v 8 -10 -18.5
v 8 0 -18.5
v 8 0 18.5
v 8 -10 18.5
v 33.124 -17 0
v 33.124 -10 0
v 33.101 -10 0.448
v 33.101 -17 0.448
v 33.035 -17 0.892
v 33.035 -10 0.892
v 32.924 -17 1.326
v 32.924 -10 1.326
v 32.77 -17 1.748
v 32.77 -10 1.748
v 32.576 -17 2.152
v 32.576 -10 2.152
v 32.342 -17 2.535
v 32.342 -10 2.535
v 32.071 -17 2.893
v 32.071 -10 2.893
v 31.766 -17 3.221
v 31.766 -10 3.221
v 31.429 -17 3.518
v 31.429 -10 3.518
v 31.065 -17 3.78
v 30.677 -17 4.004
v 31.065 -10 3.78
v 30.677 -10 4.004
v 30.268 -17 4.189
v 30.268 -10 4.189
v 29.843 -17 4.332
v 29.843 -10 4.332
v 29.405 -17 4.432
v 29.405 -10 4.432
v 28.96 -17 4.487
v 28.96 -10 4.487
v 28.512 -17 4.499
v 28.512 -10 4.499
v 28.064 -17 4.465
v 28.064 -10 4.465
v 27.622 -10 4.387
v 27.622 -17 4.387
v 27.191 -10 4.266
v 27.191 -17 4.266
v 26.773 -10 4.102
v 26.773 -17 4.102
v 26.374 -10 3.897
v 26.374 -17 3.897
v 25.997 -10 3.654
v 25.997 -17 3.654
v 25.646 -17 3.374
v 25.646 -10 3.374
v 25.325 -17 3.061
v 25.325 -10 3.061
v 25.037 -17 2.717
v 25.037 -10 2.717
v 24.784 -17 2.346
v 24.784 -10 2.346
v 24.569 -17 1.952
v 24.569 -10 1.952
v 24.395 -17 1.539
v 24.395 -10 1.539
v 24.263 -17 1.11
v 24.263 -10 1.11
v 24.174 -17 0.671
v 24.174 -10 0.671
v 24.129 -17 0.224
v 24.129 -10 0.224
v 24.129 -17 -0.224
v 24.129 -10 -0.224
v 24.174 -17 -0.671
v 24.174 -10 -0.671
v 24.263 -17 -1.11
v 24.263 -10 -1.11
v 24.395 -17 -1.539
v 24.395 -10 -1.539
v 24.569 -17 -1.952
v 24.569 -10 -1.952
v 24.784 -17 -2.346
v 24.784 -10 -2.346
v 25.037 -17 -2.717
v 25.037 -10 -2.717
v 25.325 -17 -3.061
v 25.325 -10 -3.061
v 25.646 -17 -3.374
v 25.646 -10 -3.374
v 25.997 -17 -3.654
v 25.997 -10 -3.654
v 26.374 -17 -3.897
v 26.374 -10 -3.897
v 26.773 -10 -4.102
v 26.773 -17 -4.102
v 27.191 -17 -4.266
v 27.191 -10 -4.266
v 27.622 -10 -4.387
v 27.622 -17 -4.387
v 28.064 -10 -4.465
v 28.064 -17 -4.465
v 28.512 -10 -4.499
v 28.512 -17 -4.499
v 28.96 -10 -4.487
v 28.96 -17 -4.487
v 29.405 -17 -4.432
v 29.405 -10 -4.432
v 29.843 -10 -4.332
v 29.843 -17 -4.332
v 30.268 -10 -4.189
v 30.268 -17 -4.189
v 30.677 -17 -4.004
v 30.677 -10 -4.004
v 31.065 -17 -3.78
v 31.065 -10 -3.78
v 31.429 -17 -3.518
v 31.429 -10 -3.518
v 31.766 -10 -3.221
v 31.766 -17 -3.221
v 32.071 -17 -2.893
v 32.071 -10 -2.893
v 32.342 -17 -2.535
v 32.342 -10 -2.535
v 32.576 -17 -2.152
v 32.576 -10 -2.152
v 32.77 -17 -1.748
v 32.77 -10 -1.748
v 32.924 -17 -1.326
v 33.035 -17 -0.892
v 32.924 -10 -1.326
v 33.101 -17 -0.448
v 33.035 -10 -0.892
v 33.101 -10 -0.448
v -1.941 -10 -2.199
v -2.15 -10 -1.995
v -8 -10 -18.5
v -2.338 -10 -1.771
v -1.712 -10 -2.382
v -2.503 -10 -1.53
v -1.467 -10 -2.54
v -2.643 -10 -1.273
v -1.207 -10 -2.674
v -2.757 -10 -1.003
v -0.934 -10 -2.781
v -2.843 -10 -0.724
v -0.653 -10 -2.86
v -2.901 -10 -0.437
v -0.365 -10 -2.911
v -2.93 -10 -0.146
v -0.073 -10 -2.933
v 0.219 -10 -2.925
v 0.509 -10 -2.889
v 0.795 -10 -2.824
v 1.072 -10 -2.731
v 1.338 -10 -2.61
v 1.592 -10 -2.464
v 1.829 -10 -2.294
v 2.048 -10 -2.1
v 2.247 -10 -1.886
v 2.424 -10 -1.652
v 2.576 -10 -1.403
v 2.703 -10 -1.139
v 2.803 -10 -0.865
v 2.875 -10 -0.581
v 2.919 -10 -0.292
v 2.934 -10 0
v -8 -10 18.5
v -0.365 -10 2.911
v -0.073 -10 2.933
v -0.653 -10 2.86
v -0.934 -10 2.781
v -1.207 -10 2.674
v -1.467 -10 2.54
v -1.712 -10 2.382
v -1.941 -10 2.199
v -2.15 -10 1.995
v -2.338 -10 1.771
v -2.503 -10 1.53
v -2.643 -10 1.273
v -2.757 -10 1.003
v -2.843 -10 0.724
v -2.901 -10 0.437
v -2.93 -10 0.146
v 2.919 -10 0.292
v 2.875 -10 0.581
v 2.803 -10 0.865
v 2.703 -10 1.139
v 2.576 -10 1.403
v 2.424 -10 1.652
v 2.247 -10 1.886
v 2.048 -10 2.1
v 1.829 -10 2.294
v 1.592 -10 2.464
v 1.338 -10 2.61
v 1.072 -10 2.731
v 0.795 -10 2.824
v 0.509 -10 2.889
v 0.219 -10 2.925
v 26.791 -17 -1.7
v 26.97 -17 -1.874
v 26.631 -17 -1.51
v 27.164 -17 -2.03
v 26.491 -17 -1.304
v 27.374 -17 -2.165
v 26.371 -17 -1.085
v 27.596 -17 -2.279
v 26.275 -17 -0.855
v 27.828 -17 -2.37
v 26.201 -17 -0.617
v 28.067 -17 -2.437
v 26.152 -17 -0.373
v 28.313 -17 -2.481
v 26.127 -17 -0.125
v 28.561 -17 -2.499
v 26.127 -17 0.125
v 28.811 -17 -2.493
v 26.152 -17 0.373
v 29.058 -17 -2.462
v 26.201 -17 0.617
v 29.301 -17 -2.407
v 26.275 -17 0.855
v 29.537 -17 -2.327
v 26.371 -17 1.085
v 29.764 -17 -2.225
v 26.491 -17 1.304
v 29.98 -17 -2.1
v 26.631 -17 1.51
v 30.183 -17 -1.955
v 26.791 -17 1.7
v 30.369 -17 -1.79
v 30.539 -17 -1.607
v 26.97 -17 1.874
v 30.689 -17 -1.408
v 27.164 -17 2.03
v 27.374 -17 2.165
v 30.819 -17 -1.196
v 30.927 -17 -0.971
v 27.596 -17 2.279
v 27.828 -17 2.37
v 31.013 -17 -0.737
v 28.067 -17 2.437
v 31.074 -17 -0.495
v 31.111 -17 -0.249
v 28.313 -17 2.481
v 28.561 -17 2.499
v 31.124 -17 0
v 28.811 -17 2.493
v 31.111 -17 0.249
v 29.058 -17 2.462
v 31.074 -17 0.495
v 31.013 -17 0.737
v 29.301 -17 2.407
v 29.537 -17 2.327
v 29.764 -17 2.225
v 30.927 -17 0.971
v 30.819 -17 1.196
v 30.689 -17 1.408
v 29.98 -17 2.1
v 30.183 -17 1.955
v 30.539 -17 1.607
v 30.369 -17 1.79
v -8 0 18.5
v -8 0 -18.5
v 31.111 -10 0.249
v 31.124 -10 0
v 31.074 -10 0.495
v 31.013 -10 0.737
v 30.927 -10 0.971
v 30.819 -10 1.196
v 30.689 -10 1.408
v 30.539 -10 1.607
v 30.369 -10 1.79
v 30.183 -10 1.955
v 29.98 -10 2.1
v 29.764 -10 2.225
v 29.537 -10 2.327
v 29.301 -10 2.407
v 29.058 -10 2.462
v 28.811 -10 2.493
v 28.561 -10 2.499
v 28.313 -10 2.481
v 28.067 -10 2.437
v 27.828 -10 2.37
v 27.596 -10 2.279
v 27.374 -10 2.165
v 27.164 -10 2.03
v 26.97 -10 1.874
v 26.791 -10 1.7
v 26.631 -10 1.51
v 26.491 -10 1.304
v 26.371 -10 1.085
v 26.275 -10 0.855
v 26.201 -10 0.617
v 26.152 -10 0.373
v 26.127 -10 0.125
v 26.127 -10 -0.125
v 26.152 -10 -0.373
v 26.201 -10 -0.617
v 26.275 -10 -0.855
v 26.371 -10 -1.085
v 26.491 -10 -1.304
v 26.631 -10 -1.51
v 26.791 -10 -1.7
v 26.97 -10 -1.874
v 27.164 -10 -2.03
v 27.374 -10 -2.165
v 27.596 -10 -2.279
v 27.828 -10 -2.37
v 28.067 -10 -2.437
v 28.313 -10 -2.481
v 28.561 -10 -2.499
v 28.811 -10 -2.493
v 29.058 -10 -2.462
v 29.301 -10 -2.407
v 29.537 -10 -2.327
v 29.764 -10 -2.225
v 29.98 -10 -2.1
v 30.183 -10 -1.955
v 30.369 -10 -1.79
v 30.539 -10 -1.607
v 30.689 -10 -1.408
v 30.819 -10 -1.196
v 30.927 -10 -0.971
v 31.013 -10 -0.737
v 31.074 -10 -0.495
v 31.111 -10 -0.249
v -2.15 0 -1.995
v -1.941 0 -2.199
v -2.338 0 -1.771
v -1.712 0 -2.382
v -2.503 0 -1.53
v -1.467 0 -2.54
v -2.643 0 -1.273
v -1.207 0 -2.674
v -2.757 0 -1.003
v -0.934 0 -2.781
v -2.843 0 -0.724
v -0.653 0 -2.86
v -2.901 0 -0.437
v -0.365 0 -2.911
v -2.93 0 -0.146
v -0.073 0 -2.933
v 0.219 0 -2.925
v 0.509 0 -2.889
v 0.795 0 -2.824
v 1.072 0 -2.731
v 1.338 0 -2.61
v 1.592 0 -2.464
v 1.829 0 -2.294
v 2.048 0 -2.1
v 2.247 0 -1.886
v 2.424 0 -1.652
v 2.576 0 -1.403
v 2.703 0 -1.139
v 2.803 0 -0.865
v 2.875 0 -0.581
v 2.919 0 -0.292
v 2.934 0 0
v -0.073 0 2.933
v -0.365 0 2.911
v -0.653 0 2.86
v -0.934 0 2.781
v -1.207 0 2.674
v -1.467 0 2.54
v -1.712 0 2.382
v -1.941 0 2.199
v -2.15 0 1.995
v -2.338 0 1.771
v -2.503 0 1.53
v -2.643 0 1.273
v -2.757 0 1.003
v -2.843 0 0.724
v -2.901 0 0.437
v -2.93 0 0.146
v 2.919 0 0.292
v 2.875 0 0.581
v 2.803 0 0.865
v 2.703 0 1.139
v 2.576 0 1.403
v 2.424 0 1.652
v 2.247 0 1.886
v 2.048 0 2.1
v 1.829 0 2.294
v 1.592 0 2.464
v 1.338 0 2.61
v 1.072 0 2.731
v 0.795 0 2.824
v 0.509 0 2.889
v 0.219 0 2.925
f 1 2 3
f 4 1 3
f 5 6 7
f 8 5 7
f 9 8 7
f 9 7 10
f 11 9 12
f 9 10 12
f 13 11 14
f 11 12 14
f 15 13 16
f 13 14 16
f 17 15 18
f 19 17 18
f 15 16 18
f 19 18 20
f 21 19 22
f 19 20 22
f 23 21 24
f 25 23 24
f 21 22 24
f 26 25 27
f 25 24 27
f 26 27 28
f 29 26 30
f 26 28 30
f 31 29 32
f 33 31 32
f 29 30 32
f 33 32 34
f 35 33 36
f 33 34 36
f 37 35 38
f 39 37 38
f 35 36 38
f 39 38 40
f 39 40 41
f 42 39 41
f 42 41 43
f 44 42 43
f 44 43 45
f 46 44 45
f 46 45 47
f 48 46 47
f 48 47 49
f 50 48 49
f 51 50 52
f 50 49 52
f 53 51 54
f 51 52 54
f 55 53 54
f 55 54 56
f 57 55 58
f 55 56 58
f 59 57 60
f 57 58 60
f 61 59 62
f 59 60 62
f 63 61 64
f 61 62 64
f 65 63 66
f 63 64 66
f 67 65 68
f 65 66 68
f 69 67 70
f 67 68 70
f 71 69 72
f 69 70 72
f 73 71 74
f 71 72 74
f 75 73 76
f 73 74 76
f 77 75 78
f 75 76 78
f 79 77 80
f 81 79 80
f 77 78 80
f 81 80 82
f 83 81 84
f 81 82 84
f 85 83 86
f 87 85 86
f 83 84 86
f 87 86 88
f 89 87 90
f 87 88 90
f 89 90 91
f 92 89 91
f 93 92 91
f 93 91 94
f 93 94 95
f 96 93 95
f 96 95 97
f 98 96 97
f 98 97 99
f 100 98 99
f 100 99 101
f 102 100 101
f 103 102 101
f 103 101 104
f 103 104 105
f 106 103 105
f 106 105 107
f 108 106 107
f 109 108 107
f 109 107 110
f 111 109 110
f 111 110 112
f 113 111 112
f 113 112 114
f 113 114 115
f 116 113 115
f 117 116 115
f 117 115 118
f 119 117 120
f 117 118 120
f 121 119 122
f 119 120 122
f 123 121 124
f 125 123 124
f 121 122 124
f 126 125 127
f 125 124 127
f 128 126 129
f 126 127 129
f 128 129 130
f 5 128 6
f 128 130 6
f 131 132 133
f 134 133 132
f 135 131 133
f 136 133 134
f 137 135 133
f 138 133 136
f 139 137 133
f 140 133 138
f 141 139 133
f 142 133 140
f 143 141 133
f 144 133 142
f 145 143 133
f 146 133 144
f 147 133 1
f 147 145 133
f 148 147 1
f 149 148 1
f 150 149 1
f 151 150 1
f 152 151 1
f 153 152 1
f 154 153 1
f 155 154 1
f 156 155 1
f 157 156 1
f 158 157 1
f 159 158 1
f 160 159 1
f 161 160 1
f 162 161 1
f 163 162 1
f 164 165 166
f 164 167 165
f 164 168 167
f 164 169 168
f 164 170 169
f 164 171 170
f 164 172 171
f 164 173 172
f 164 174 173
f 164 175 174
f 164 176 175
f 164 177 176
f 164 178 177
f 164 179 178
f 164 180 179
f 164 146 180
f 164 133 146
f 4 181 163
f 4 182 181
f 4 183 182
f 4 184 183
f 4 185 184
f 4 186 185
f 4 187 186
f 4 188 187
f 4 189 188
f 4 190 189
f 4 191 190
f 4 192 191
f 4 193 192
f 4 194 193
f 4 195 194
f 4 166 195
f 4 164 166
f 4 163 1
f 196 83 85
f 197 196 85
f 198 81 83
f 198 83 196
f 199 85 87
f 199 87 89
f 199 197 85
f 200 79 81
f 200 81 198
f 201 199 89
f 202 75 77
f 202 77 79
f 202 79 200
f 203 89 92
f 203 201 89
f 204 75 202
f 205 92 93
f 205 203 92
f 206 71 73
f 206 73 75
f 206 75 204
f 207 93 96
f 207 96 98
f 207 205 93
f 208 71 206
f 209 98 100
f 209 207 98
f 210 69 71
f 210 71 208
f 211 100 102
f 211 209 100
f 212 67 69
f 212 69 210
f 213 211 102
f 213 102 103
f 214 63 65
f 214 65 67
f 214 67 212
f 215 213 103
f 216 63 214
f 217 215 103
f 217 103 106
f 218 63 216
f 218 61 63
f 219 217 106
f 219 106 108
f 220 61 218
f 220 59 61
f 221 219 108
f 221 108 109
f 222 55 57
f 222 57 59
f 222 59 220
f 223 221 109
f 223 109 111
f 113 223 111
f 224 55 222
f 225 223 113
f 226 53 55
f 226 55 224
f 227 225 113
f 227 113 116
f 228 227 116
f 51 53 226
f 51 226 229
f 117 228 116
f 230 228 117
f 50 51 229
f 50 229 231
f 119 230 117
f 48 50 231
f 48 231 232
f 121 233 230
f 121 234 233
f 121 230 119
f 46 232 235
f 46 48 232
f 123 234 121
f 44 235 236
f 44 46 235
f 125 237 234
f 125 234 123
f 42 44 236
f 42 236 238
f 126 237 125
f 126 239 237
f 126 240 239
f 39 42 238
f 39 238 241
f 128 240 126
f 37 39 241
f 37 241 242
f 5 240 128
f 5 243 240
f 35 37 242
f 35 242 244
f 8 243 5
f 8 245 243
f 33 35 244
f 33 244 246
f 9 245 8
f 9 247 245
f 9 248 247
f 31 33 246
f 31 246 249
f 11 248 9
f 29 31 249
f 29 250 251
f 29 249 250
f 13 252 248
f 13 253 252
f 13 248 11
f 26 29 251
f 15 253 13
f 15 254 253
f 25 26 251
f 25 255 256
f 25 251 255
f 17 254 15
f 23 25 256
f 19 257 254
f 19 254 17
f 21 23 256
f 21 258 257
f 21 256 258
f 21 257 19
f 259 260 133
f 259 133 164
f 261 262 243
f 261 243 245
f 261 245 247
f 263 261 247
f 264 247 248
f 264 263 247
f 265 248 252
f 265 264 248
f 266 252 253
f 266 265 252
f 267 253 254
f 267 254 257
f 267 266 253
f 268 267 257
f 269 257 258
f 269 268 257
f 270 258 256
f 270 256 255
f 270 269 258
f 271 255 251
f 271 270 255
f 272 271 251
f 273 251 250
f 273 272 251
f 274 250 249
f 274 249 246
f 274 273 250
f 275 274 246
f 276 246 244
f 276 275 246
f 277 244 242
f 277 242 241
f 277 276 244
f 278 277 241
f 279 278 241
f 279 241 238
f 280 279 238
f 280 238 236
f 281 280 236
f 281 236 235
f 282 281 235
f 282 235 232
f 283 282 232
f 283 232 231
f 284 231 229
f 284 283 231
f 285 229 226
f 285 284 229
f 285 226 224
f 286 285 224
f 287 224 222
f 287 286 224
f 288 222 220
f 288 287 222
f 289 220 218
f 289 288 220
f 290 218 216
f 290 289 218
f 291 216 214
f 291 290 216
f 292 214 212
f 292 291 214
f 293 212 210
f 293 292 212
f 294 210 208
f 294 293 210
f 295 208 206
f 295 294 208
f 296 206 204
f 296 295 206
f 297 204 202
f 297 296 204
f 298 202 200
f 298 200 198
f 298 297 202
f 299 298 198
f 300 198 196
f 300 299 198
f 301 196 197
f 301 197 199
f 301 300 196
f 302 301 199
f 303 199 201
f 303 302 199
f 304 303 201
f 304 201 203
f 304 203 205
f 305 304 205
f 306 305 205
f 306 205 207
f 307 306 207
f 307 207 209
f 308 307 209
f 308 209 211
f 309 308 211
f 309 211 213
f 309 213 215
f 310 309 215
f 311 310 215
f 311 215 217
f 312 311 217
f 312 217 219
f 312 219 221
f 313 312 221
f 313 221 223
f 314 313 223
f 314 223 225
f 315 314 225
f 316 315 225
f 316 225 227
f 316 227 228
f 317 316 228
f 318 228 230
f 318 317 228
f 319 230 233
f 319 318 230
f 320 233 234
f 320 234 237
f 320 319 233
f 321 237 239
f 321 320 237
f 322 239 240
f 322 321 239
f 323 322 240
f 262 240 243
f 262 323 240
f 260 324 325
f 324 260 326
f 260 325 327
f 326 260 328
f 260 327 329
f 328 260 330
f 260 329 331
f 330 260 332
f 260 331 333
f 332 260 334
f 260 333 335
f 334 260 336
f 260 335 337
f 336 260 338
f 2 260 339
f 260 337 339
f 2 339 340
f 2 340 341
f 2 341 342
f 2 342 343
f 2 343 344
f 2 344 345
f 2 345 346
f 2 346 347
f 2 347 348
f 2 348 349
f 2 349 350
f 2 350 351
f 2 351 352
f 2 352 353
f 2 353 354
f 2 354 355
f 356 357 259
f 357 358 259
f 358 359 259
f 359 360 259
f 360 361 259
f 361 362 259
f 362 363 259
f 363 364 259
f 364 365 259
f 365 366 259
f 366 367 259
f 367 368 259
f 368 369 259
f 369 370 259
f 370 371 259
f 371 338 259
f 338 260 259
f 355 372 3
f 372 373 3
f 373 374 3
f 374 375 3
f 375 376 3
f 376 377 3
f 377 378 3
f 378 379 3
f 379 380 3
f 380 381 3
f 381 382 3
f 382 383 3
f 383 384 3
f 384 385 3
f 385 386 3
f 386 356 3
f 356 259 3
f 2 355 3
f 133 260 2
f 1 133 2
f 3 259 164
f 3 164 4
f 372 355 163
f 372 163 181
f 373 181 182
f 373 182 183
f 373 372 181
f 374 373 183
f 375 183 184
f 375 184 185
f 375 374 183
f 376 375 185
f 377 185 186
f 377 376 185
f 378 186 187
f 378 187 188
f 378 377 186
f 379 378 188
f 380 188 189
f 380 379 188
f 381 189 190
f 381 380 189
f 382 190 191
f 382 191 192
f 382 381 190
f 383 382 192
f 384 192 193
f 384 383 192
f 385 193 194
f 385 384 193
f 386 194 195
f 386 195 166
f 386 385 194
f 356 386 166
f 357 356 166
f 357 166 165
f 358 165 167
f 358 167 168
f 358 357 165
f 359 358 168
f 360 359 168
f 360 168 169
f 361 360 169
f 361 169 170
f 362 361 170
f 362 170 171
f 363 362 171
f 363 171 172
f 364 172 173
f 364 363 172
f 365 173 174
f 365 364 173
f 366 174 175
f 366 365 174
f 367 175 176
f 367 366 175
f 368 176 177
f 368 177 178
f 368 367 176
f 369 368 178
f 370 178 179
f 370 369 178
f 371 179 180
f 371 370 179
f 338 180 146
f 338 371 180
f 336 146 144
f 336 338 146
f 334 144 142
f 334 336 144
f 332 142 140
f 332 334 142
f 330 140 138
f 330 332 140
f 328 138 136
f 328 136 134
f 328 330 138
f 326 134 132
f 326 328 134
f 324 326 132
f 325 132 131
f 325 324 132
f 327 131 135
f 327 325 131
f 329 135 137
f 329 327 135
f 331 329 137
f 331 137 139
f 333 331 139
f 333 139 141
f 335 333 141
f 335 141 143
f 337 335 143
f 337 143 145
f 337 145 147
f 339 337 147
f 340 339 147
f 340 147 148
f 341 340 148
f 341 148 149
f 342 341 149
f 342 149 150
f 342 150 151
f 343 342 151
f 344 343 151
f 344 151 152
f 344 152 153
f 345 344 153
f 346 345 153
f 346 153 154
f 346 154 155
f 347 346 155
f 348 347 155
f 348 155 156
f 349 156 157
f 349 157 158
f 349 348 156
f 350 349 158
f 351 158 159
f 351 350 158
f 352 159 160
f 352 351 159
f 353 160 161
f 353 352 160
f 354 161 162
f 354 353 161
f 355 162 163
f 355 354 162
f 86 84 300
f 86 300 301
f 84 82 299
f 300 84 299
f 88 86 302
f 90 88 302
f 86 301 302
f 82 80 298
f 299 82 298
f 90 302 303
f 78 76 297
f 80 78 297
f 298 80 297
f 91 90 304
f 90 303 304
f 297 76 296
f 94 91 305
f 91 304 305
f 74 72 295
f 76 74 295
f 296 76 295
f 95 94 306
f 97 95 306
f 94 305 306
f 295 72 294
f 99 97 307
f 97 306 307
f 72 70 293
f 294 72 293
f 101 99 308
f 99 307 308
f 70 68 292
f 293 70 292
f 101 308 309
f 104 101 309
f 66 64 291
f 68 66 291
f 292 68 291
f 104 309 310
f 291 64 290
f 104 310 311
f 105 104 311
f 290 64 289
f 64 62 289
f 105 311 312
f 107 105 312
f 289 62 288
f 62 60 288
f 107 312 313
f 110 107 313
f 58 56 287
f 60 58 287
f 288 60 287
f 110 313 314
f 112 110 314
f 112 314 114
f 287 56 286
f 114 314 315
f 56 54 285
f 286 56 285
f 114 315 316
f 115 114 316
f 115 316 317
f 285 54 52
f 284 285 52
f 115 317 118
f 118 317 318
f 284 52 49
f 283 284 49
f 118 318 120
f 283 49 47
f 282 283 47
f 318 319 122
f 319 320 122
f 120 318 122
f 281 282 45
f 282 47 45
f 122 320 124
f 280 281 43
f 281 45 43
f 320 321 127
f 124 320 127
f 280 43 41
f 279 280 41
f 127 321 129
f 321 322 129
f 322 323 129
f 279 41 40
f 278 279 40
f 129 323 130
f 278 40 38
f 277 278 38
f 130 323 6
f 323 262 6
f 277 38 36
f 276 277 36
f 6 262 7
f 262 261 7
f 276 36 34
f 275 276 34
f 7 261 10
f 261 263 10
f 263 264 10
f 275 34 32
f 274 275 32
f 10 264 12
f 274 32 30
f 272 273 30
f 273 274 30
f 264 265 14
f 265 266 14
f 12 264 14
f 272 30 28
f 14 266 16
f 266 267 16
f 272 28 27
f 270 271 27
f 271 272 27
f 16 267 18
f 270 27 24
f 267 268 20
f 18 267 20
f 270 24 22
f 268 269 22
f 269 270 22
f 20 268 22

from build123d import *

# Parameters (mm, degrees)
F0_W     = 16
F0_H     = 37
F0_R     = 2.9335
F1_DEPTH = 10
F2_R     = 4.5
F2_R_2   = 2.5
F3_DEPTH = 7


with BuildPart() as f1:
    # F0 (on Front) → F1 (new body)
    with BuildSketch(Plane.XZ):
        Rectangle(F0_W, F0_H)
        Circle(F0_R, mode=Mode.SUBTRACT)
    extrude(amount=F1_DEPTH)


with BuildPart() as f3:
    # F2 (on face) → F3 (new body)
    with BuildSketch(Plane.XZ.offset(10)):
        with Locations((28.623779, 0)):
            Circle(F2_R)
        with Locations((28.623779, 0)):
            Circle(F2_R_2, mode=Mode.SUBTRACT)
    extrude(amount=F3_DEPTH)


solid = Compound([f1.part, f3.part])
